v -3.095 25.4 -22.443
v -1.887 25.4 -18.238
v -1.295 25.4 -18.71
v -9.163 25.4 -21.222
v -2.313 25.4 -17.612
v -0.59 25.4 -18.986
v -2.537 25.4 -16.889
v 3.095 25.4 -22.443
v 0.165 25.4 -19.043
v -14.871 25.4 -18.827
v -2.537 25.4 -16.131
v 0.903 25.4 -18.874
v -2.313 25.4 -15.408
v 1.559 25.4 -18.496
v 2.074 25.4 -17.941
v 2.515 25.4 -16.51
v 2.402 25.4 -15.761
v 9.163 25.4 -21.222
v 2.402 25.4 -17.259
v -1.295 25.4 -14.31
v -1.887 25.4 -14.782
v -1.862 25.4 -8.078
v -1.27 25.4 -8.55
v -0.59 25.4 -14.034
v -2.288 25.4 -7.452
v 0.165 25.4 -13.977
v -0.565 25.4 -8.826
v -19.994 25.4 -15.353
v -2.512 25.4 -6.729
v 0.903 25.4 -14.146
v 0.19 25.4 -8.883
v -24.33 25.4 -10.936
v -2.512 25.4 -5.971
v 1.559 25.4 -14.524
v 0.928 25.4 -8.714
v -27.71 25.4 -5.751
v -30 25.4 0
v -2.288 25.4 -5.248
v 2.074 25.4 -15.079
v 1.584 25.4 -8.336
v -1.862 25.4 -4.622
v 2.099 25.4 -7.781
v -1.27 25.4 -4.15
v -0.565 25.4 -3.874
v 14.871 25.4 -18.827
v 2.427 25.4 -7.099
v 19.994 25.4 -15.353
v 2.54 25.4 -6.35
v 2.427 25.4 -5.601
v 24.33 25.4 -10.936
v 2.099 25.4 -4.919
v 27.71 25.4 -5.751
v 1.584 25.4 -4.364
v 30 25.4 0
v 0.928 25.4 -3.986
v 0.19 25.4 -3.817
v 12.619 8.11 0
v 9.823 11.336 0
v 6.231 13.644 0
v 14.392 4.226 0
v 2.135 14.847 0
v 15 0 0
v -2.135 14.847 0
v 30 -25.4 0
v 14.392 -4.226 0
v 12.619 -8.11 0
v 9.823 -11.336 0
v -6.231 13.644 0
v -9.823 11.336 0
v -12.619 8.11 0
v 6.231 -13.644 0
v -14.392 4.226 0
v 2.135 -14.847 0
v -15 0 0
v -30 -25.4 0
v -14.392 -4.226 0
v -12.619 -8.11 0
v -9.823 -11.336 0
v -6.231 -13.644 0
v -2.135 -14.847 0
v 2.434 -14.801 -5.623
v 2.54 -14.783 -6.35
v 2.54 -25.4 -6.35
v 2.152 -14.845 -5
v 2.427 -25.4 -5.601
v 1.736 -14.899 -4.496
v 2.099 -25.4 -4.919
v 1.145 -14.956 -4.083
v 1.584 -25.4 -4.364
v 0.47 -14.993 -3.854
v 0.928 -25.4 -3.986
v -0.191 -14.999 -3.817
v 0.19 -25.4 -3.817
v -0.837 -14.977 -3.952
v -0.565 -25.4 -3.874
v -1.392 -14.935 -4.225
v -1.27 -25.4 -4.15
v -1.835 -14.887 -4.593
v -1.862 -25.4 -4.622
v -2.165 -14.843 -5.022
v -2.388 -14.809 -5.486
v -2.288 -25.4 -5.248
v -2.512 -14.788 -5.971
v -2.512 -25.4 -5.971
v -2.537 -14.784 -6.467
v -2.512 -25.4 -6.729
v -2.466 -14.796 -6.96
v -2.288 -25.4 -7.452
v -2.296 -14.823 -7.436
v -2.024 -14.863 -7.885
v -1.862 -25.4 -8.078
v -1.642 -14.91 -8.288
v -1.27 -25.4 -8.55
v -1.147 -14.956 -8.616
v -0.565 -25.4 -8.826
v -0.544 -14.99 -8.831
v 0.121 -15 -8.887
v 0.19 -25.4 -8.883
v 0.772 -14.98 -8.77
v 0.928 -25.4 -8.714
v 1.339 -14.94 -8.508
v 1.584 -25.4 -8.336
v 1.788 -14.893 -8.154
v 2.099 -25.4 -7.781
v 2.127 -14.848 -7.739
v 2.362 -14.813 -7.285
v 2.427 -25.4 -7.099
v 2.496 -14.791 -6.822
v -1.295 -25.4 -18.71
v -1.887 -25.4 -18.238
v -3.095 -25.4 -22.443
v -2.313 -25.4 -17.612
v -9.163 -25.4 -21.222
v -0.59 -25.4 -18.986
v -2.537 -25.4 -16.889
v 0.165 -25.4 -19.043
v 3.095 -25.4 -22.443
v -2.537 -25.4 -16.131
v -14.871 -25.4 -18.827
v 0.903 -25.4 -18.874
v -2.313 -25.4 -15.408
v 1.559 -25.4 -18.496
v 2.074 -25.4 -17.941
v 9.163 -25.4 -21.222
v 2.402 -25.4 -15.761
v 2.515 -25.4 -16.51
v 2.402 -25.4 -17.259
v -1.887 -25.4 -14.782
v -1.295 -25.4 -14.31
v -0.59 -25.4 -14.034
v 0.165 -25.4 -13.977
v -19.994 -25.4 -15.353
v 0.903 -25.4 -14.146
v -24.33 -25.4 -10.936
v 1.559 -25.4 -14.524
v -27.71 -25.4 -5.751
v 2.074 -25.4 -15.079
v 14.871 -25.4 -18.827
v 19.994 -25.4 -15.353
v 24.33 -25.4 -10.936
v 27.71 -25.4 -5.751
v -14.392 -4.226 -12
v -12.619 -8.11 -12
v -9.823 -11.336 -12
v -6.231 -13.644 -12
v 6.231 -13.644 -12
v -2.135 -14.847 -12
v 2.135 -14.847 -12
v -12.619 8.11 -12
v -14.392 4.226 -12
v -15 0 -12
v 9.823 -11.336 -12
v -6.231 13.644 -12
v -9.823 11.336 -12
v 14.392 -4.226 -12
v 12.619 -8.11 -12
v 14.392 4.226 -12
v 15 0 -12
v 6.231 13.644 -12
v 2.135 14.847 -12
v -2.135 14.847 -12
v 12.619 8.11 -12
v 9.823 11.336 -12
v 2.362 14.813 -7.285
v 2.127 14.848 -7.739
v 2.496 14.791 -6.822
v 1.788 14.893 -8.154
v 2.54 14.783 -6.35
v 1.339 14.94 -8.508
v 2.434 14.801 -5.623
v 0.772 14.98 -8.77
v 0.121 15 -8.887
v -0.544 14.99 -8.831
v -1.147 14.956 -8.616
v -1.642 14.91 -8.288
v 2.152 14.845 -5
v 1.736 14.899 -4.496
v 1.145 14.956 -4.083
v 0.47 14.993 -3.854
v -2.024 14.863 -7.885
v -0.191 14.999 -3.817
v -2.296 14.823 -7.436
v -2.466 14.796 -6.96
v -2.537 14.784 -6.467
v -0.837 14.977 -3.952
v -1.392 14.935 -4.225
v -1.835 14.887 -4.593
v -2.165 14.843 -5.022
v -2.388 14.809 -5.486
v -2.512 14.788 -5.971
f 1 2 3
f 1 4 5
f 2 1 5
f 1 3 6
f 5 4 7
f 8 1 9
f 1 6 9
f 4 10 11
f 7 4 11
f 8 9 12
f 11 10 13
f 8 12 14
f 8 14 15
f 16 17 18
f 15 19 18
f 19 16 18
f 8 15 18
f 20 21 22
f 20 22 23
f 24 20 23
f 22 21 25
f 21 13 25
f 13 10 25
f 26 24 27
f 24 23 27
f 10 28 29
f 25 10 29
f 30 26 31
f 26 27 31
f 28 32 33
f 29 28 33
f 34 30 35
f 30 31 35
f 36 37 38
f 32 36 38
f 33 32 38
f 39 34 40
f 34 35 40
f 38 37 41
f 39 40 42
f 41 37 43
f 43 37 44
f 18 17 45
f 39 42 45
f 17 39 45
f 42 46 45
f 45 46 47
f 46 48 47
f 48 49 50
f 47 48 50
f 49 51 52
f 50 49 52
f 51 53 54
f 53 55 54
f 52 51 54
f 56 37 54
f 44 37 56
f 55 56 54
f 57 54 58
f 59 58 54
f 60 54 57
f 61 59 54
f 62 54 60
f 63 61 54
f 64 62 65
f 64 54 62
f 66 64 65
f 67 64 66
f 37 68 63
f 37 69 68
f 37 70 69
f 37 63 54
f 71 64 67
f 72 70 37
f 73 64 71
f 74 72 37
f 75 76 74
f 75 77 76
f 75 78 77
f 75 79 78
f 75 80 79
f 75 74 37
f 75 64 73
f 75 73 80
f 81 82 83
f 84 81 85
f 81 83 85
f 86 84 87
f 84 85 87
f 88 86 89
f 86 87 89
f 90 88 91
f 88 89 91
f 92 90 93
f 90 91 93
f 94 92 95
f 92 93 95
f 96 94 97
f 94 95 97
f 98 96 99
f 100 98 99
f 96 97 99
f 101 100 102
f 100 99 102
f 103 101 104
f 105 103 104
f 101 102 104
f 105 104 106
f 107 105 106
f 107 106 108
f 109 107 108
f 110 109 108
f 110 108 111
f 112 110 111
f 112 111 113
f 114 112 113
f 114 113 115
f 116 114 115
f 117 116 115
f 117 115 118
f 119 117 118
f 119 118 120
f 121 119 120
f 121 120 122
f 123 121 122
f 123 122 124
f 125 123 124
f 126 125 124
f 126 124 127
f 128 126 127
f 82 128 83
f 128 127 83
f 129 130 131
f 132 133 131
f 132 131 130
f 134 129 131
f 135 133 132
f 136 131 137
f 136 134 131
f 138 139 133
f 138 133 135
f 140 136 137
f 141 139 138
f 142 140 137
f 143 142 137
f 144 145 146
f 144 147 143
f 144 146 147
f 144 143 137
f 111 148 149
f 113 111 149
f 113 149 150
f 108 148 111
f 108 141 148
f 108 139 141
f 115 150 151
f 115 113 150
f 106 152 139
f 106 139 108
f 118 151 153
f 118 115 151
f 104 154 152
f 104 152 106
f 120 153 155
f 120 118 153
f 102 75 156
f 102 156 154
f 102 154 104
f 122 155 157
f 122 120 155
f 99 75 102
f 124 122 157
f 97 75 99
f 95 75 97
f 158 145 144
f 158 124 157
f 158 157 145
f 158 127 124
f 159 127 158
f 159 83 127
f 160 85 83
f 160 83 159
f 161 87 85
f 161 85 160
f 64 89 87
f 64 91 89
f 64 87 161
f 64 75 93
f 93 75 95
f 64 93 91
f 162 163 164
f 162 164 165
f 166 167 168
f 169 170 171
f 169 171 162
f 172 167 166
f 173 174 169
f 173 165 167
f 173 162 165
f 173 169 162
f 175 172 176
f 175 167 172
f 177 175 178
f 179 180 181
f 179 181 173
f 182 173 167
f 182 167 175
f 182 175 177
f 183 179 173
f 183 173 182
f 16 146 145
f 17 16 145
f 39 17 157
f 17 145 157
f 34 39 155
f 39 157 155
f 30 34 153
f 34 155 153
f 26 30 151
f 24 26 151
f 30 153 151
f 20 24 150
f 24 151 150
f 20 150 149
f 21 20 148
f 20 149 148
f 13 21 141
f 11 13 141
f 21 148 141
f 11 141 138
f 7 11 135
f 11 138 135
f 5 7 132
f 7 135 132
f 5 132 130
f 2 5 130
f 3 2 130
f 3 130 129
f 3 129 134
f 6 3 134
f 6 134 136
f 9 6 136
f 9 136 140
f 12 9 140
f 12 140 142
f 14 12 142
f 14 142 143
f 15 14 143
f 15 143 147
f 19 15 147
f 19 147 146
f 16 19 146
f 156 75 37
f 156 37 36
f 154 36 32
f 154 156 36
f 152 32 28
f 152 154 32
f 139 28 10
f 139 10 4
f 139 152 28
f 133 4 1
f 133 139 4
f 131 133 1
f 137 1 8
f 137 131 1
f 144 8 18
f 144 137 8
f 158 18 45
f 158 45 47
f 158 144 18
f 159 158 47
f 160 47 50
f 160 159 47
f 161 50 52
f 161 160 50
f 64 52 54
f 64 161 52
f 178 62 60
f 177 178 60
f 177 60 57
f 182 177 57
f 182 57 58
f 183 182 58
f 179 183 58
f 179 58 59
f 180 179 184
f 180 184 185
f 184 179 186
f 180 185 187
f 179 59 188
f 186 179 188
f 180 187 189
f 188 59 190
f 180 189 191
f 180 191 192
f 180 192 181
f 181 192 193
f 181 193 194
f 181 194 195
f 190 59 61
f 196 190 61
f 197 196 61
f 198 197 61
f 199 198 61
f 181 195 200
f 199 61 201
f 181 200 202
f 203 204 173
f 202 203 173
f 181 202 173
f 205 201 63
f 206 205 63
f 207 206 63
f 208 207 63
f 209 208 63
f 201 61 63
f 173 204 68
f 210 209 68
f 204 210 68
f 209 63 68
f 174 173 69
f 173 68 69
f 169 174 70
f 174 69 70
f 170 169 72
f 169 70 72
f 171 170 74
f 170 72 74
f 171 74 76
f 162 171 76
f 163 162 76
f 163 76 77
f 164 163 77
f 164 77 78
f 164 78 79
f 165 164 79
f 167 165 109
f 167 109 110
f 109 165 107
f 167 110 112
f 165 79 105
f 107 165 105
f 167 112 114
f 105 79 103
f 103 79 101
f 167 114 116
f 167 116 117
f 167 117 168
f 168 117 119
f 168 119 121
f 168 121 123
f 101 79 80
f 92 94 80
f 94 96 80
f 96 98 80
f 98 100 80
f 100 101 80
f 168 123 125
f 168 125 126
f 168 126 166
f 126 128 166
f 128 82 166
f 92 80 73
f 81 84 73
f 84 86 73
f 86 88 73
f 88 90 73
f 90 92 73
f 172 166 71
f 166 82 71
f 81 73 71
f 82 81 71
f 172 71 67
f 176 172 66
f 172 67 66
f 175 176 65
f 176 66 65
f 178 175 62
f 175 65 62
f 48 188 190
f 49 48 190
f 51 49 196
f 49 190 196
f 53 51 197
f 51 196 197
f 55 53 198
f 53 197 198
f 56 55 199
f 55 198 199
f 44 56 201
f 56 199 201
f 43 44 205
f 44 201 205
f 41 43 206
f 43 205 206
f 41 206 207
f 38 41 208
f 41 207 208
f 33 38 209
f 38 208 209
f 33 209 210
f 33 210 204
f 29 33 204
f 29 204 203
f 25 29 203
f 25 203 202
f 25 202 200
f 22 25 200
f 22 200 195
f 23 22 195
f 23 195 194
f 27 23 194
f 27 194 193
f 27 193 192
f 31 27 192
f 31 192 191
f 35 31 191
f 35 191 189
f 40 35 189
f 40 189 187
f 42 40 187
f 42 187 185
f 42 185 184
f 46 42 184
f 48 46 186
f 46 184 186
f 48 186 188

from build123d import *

# Parameters (mm, degrees)
F1_DEPTH      = 25.4
F1_DEPTH_BACK = 25.4
F2_R          = 15
F3_DEPTH      = 12
F5_R          = 2.54
F6_DEPTH      = 127


with BuildPart() as f1:
    # F0 (on Front) → F1 (new body, two sides)
    with BuildSketch(Plane.XZ) as f1_sk:
        with BuildLine():
            Line((30, 0), (-30, 0))
            ThreePointArc((-30, 0), (0, -22.597278), (30, 0))
        make_face()
    extrude(amount=F1_DEPTH)
    extrude(f1_sk.sketch, amount=-F1_DEPTH_BACK)

    # F2 (on face) → F3 (cut)
    with BuildSketch(Plane.XY):
        Circle(F2_R)
    extrude(amount=-F3_DEPTH, mode=Mode.SUBTRACT)

    # F5 (on face) → F6 (cut)
    with BuildSketch(Plane.XZ.offset(25.4)):
        with Locations((0, -6.35)):
            Circle(F5_R)
        with Locations((-0.024882, -16.51)):
            Circle(F5_R)
    extrude(amount=-F6_DEPTH, mode=Mode.SUBTRACT)


solid = f1.part
